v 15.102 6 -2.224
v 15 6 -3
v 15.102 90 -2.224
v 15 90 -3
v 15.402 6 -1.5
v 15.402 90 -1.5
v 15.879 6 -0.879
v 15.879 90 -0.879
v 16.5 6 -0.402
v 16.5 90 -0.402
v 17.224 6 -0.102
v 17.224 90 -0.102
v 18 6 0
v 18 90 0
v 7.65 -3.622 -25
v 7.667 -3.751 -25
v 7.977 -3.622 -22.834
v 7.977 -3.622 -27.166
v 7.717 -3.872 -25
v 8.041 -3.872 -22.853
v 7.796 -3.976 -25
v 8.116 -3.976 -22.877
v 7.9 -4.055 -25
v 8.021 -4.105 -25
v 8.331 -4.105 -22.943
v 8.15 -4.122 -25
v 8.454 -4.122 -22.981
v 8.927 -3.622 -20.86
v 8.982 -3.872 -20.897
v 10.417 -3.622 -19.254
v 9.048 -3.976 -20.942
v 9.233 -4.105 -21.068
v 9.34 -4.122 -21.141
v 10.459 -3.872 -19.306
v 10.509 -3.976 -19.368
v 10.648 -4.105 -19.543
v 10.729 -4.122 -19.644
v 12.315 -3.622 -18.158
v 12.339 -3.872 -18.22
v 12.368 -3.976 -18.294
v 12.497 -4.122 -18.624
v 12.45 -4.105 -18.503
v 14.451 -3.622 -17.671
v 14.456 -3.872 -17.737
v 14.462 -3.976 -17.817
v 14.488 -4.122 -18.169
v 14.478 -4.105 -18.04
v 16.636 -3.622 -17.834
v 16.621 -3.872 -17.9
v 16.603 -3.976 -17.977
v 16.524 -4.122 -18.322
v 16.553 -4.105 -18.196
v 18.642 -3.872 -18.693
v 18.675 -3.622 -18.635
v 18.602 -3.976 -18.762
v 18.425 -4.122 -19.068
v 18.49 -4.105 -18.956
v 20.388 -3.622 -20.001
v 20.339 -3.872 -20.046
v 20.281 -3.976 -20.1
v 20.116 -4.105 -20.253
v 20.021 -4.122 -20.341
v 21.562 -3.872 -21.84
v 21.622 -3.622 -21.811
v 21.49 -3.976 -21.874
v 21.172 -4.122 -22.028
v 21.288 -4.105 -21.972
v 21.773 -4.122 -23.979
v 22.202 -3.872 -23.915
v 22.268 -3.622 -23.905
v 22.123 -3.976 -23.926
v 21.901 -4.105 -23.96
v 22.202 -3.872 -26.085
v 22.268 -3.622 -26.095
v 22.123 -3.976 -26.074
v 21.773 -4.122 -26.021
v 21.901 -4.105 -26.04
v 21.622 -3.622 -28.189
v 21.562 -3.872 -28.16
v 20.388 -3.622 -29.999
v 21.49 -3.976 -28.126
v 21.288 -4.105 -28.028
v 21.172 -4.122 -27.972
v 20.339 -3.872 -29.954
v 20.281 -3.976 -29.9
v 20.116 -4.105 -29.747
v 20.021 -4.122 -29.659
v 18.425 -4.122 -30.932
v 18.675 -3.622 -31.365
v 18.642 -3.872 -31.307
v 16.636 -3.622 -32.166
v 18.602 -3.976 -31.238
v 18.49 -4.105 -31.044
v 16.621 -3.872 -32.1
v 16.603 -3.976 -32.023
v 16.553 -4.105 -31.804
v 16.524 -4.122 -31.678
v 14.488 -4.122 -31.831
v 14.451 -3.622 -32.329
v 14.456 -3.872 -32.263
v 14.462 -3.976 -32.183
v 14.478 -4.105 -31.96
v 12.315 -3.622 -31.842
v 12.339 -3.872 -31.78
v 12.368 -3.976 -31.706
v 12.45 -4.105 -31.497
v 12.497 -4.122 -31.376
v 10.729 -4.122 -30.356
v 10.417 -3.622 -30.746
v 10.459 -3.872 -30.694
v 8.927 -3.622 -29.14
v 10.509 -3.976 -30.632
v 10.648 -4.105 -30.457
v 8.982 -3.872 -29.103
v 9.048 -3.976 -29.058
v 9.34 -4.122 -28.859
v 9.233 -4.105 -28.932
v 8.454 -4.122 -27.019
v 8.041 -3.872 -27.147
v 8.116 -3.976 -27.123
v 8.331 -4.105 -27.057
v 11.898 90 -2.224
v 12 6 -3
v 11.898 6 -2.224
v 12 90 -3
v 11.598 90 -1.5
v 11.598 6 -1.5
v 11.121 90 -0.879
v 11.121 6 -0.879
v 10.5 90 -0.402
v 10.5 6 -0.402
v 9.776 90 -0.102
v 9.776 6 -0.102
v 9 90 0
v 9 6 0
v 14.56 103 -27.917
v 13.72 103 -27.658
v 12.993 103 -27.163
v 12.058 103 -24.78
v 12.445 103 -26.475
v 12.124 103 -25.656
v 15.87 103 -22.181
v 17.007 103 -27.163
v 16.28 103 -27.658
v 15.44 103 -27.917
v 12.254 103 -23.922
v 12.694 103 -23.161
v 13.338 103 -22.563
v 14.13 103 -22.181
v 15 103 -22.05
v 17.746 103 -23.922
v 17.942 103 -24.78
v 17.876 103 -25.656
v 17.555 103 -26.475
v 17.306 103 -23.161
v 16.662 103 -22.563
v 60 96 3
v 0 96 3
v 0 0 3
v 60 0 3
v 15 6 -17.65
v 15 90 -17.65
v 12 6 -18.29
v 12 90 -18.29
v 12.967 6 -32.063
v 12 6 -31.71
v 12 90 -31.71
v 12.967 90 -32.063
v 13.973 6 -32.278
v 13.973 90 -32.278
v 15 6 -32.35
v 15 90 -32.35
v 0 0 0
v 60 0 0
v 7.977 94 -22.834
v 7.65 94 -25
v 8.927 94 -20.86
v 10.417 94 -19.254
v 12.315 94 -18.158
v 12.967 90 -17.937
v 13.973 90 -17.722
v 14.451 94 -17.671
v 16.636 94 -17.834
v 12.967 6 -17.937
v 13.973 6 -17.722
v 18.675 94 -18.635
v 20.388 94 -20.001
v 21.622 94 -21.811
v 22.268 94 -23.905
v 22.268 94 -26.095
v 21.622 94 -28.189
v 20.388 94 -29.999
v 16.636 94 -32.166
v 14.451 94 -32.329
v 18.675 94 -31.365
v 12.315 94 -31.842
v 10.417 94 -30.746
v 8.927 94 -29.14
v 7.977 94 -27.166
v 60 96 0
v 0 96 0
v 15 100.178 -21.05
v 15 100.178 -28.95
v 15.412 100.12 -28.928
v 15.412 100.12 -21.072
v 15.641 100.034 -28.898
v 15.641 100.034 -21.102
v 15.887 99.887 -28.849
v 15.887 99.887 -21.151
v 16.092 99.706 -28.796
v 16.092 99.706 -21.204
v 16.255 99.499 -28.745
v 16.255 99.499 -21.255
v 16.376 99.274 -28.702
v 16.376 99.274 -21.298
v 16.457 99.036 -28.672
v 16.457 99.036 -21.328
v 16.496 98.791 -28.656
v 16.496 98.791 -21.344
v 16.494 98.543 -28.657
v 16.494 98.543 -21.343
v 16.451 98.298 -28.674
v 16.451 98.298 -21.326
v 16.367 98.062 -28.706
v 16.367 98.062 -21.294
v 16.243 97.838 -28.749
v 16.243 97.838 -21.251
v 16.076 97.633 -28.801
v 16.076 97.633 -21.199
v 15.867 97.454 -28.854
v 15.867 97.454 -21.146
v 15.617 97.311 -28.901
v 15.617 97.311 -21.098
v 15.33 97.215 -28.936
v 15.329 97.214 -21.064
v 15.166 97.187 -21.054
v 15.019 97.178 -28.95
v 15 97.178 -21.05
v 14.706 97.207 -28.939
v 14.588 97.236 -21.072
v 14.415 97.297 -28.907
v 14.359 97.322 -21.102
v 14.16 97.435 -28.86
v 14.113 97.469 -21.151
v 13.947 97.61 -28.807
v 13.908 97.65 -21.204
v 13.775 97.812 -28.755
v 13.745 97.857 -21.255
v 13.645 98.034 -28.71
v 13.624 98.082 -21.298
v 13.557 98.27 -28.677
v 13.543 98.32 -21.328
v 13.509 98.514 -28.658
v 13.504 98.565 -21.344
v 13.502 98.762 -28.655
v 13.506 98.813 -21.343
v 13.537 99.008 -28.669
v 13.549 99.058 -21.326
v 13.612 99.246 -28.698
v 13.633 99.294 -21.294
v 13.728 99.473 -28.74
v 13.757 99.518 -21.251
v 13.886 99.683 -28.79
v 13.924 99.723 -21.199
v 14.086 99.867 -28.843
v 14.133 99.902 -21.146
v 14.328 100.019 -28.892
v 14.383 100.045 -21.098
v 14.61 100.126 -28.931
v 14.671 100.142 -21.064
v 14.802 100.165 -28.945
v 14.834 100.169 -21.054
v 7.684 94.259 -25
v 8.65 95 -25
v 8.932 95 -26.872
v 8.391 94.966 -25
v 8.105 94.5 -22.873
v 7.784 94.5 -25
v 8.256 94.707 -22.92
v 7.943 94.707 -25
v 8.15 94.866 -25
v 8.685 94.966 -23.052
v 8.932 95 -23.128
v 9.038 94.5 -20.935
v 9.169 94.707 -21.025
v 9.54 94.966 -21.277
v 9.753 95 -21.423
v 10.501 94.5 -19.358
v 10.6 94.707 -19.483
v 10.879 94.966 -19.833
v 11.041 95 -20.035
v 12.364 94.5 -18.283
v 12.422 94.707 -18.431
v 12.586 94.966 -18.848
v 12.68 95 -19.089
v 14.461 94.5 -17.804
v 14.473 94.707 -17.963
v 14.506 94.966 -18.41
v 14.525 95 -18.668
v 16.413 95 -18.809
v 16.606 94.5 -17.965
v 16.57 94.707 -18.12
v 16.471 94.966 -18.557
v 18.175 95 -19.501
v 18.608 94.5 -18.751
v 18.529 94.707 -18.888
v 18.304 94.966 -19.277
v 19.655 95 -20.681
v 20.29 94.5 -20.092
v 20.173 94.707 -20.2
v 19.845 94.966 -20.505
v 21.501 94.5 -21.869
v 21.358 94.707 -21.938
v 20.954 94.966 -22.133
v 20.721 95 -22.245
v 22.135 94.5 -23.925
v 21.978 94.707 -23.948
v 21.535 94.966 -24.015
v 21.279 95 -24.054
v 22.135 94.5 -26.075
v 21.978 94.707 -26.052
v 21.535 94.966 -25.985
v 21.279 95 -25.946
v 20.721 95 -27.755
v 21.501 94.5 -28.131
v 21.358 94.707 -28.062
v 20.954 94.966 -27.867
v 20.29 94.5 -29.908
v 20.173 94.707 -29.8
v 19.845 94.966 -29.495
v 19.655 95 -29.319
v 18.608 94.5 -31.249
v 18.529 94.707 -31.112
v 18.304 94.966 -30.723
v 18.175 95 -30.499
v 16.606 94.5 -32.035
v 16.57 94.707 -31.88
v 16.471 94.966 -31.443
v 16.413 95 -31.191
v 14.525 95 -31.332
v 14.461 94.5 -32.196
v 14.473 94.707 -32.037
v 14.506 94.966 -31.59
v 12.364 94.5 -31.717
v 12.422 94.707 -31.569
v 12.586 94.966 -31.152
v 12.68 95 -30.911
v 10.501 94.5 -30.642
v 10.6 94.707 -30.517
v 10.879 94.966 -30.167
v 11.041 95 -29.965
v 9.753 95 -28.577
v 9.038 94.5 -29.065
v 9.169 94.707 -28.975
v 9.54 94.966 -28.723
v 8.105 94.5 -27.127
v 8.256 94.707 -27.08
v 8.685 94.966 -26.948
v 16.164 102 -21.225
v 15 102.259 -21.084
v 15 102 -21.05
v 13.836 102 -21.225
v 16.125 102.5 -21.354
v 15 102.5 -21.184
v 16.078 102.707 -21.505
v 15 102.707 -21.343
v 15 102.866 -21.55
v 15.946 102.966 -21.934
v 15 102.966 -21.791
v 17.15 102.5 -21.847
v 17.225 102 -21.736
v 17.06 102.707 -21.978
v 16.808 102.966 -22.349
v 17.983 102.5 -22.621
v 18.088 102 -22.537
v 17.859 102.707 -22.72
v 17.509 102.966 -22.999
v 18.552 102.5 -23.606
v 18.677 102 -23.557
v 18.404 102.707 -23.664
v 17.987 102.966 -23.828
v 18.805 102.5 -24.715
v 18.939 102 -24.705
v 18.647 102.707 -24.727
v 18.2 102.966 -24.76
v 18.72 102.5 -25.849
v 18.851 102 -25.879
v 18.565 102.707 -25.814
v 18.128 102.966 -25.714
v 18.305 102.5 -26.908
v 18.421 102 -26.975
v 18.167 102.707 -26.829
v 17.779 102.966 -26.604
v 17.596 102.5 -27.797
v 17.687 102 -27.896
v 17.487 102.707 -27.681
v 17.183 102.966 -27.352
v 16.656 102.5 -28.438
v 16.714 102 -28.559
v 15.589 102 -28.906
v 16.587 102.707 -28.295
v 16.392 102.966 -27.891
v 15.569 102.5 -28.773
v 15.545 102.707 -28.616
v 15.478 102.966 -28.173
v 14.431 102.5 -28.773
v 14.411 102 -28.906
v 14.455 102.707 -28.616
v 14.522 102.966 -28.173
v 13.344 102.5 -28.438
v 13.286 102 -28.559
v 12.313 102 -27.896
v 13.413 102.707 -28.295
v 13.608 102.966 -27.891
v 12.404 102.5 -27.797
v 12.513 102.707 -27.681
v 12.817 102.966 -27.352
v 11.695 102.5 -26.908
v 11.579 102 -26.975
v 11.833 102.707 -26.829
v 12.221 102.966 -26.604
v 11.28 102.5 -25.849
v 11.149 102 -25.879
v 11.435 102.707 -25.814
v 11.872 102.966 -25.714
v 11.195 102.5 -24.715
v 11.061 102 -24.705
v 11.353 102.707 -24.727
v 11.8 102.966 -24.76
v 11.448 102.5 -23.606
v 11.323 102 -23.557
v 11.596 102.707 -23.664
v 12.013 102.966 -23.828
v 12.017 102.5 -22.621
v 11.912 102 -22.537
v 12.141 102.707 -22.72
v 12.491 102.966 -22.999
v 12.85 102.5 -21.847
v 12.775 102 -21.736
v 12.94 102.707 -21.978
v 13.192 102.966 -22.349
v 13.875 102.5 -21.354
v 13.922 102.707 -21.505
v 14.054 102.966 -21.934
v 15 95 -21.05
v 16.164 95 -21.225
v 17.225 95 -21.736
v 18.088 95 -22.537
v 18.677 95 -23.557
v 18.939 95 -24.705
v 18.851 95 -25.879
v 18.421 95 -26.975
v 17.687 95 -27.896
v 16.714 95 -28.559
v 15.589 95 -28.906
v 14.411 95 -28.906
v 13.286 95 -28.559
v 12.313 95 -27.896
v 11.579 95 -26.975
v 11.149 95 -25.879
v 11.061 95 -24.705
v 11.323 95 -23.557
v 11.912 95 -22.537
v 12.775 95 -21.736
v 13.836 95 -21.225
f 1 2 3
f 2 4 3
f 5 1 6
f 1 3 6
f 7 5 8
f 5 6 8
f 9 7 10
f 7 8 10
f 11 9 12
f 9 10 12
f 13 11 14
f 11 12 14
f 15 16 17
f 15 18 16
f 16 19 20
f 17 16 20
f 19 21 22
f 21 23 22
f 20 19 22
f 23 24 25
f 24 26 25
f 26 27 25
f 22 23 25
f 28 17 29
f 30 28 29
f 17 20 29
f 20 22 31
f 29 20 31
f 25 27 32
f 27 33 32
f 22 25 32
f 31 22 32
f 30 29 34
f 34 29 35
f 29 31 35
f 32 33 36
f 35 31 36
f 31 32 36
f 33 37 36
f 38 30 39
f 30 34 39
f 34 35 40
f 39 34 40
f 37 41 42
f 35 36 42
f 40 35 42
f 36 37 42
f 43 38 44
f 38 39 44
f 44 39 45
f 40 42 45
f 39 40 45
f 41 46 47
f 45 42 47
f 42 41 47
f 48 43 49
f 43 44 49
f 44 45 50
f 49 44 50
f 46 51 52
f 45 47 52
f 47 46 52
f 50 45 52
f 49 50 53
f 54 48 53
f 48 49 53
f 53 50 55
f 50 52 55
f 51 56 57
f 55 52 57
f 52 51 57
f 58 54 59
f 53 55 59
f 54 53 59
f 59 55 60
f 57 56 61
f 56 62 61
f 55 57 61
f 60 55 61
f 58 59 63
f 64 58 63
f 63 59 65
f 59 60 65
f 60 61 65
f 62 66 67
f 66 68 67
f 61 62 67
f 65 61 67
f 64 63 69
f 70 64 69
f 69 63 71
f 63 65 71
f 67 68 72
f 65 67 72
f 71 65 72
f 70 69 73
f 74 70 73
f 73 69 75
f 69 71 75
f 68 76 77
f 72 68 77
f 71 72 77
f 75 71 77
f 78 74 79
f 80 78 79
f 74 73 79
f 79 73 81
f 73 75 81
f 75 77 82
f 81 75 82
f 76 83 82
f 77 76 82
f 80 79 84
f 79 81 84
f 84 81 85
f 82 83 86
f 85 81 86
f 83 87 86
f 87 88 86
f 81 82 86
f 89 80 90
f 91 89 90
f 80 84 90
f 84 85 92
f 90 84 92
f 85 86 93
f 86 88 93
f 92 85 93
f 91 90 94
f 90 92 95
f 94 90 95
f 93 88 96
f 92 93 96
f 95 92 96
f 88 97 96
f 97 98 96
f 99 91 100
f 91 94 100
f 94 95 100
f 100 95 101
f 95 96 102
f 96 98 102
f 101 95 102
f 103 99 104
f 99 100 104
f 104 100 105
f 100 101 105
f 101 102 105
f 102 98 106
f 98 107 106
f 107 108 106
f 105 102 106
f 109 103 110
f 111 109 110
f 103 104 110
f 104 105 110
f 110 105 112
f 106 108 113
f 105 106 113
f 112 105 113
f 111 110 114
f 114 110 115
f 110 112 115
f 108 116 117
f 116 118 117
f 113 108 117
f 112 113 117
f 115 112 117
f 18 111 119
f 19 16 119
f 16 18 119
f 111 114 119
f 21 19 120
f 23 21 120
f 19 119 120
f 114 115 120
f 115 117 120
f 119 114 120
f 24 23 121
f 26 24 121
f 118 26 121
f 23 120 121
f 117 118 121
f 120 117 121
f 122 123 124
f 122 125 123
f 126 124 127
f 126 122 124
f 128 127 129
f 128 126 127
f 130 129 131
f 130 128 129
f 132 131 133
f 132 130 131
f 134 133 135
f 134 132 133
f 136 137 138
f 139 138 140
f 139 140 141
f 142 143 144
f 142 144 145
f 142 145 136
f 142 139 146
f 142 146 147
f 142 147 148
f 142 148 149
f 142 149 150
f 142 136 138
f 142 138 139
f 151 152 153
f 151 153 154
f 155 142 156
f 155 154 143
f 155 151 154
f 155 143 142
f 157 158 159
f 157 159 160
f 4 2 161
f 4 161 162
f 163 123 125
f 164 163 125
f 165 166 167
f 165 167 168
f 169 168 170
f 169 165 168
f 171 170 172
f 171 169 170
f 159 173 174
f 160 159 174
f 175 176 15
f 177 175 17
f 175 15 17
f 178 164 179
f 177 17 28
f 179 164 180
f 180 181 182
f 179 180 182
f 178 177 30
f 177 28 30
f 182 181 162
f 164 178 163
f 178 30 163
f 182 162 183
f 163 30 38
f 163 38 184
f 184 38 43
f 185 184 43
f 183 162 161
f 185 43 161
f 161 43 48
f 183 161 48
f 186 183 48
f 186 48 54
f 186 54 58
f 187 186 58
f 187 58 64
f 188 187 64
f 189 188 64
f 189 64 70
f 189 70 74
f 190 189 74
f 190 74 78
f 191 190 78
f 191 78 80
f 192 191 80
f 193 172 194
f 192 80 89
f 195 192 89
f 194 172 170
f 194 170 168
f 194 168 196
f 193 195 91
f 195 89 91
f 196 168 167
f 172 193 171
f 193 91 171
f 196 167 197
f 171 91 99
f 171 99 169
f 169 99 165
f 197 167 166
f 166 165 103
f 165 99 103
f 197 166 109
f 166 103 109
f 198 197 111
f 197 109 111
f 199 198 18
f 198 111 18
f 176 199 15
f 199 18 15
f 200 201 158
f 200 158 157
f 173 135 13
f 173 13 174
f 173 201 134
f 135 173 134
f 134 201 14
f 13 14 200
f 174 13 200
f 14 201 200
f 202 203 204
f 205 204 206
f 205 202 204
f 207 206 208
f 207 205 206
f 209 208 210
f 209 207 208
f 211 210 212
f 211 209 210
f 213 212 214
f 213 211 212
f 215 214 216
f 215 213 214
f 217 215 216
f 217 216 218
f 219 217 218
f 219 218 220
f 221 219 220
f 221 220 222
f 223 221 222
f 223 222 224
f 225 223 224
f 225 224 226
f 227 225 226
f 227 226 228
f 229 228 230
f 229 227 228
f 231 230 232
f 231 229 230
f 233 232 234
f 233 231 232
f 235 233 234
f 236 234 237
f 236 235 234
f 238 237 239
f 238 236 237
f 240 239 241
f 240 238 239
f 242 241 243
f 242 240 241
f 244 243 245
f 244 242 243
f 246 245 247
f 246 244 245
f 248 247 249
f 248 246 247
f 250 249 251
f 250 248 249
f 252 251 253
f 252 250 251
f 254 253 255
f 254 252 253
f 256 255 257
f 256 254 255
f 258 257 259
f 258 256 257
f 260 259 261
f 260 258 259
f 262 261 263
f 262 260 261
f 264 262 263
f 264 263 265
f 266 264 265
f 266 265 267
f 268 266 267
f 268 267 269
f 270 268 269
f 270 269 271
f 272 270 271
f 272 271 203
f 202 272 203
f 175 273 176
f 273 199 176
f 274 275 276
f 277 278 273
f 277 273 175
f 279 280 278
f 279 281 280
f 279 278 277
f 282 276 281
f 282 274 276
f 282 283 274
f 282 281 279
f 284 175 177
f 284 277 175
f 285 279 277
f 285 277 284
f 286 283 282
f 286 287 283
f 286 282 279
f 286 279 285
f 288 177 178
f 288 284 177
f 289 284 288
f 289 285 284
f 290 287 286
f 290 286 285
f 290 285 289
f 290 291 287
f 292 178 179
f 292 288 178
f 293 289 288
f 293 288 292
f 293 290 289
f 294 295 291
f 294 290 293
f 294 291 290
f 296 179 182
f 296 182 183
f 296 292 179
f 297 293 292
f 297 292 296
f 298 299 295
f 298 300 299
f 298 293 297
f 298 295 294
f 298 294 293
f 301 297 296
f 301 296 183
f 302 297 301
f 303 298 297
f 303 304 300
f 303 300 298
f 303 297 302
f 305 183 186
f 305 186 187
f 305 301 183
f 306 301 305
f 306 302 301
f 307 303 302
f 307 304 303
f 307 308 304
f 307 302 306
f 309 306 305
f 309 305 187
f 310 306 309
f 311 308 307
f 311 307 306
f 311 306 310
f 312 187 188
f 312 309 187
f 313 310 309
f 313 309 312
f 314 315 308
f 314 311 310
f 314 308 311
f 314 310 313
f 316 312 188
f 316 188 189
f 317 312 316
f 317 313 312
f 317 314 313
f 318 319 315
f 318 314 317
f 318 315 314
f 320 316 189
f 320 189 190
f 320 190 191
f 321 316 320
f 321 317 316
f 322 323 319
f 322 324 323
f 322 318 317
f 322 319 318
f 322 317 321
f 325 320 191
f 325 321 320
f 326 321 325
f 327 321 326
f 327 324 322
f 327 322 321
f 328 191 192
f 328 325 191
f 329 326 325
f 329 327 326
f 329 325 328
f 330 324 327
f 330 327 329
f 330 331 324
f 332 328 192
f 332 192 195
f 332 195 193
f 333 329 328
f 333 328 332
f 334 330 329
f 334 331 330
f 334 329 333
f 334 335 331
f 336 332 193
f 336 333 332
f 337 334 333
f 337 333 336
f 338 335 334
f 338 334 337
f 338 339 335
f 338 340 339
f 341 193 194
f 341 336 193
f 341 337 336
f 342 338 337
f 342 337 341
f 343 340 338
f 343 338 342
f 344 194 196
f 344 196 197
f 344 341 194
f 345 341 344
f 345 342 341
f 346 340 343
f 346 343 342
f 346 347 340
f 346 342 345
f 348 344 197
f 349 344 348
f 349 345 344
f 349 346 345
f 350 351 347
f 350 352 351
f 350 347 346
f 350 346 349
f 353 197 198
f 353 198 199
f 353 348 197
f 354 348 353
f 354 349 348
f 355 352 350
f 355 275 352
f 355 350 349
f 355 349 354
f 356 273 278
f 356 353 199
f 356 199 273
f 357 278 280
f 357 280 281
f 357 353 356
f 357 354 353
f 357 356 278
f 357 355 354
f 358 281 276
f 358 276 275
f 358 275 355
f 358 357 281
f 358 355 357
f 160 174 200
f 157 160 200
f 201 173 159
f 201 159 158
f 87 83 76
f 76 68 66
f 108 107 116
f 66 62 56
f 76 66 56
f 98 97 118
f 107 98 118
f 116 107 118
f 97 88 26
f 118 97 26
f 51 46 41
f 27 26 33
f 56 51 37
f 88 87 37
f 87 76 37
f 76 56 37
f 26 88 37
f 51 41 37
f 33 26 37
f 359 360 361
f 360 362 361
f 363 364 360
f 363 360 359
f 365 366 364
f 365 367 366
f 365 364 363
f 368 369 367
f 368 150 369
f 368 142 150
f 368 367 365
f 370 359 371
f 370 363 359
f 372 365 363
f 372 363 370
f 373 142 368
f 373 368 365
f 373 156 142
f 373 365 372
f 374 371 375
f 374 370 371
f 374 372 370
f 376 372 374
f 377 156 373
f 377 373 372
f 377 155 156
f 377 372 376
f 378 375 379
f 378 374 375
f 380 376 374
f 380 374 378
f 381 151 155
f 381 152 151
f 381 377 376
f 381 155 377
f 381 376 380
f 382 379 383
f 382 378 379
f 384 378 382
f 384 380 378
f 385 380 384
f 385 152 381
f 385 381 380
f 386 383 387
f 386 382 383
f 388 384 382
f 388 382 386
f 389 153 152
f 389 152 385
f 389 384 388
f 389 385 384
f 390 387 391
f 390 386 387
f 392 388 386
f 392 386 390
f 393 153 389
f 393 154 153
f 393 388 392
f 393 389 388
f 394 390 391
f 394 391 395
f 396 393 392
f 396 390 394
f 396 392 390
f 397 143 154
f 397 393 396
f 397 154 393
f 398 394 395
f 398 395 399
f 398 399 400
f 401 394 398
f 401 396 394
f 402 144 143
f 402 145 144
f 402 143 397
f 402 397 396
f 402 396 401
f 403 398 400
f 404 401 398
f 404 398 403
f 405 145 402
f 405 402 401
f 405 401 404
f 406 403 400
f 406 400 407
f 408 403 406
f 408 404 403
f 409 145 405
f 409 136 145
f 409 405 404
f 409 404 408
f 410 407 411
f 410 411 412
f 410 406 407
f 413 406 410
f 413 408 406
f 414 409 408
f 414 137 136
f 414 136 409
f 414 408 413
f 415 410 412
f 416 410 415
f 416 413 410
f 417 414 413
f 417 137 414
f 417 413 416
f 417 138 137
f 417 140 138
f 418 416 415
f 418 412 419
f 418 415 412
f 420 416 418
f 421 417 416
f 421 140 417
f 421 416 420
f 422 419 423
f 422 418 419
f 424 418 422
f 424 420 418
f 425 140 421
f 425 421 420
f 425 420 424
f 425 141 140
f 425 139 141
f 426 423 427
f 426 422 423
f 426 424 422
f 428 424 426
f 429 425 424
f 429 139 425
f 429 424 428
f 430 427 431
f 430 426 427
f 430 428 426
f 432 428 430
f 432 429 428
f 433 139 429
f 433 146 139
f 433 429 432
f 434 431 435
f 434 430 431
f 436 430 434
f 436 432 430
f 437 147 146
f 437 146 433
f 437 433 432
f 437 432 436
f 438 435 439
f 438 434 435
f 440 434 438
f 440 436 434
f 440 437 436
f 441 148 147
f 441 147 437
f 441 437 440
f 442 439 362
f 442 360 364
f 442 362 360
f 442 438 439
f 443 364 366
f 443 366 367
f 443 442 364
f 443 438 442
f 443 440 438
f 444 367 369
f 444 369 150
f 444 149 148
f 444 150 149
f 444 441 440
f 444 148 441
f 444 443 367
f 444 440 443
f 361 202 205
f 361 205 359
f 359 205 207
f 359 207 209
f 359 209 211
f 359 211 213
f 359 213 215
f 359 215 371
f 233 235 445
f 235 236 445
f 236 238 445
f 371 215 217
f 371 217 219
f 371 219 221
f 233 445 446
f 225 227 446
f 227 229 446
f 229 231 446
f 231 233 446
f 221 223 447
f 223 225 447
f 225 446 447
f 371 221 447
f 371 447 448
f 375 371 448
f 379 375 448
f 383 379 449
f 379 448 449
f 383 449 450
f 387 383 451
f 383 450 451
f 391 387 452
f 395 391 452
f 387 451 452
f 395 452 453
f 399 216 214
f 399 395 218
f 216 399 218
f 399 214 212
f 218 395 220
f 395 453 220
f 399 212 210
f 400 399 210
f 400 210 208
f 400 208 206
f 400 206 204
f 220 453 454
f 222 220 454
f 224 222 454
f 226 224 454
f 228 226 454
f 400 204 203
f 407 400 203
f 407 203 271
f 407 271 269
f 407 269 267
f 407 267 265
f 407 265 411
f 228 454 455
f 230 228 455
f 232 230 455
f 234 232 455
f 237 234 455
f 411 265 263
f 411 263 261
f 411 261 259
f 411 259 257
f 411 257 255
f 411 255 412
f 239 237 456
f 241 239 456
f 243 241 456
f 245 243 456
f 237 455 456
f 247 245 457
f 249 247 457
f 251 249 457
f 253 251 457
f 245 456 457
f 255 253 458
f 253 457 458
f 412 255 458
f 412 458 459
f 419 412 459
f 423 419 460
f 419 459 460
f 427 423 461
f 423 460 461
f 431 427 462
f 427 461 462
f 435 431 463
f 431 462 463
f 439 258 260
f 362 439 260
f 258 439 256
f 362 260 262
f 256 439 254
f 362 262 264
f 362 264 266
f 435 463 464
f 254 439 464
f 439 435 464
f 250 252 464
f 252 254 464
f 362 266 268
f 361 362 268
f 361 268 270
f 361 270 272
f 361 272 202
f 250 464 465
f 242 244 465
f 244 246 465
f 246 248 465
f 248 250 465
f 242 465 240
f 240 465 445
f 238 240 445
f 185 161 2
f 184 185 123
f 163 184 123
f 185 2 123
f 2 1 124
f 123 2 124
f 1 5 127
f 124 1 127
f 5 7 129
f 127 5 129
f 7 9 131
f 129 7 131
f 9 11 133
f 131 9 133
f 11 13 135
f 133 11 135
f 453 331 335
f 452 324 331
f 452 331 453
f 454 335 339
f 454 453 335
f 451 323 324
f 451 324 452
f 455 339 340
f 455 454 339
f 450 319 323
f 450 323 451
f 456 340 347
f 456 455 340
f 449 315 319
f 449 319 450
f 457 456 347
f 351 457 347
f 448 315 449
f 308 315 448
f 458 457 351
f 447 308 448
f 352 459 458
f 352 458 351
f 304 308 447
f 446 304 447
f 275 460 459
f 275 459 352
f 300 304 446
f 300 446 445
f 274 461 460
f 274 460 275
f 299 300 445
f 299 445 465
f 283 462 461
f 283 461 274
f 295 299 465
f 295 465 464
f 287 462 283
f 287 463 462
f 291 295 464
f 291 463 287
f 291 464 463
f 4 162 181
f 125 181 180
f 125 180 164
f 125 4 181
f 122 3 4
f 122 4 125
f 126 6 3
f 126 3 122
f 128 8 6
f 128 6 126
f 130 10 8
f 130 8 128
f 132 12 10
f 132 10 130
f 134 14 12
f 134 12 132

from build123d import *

# Parameters (mm, degrees)
SKETCH_1_W               = 60
SKETCH_1_H               = 96
EXTRUDE_1_DEPTH          = 3
SKETCH_2_W               = 3
SKETCH_2_H               = 84
EXTRUDE_2_DEPTH          = 38
EXTRUDE_3_DEPTH          = 5
EXTRUDE_3_DEPTH_BACK     = 94.122011
SKETCH_4_R               = 7.35
SKETCH_5_R               = 3.95
EXTRUDE_4_DEPTH          = 8
FILLET_2_R               = 1
CUT_EXTRUDE_1_DEPTH      = 124.40908597
CUT_EXTRUDE_1_DEPTH_BACK = 124.40908597
SKETCH_9_R               = 1.5
FILLET_3_R               = 0.5
CUT_EXTRUDE_START        = 6
CUT_EXTRUDE_3_DEPTH      = 84
FILLET_6_R               = 3


# Read off the part's stored shape, not the designer's step: 切除-拉伸3
with BuildPart() as part:
    # 草图1 → 凸台-拉伸1 (new body)
    with BuildSketch(Plane.XY):
        with Locations((30, 48)):
            Rectangle(SKETCH_1_W, SKETCH_1_H)
    extrude(amount=EXTRUDE_1_DEPTH)

    # 草图2 → 凸台-拉伸2 (add)
    with BuildSketch(Plane(origin=(0, 0, 0), x_dir=(-1, 0, 0), z_dir=(0, 0, -1))):
        with Locations((-13.5, 48)):
            Rectangle(SKETCH_2_W, SKETCH_2_H)
    extrude(amount=EXTRUDE_2_DEPTH)

    # 草图4 → 凸台-拉伸3 (add, two sides: drawn at the far end of the back side and taken through both)
    with BuildSketch(Plane(origin=(0, 90, 0), x_dir=(1, 0, 0), z_dir=(0, 1, 0)).offset(-EXTRUDE_3_DEPTH_BACK)):
        with Locations(Location((15, 25, 0), (0, 0, 180))):
            Circle(SKETCH_4_R)
    extrude(amount=EXTRUDE_3_DEPTH + EXTRUDE_3_DEPTH_BACK)

    # 草图5 → 凸台-拉伸4 (add)
    with BuildSketch(Plane(origin=(0, 95, 0), x_dir=(1, 0, 0), z_dir=(0, 1, 0))):
        with Locations(Location((15, 25, 0), (0, 0, 270))):
            Circle(SKETCH_5_R)
    extrude(amount=EXTRUDE_4_DEPTH)

    # 圆角2
    fillet_2_edges = [part.edges().sort_by_distance(p)[0] for p in [
        (22.35, 95, -25),
        (15, 103, -28.95),
    ]]
    fillet(fillet_2_edges, radius=FILLET_2_R)

    # 草图9 → 切除-拉伸1 (cut, two sides: drawn at the far end of the back side and taken through both)
    with BuildSketch(Plane(origin=(0, 0, -28.95), x_dir=(-1, 0, 0), z_dir=(0, 0, -1)).offset(-CUT_EXTRUDE_1_DEPTH_BACK)):
        with Locations(Location((-15, 98.677988735, 0), (0, 0, 90.000000013))):
            Circle(SKETCH_9_R)
    extrude(amount=CUT_EXTRUDE_1_DEPTH + CUT_EXTRUDE_1_DEPTH_BACK, mode=Mode.SUBTRACT)

    # 圆角3
    fillet_3_edges = [part.edges().sort_by_distance(p)[0] for p in [
        (22.35, -4.122011, -25),
    ]]
    fillet(fillet_3_edges, radius=FILLET_3_R)

    # 切除-拉伸3 outline → 切除-拉伸3 (cut)
    with BuildSketch(Plane(origin=(0, 0, 0), x_dir=(1, 0, 0), z_dir=(0, 1, 0)).offset(CUT_EXTRUDE_START)):
        with BuildLine():
            Line((12, 38), (12, 31.709880774))
            ThreePointArc((12, 31.709880774), (13.466233996, 32.188189052), (15, 32.35))
            Line((15, 32.35), (15, 38))
            Line((15, 38), (12, 38))
        make_face()
    extrude(amount=CUT_EXTRUDE_3_DEPTH, mode=Mode.SUBTRACT)

    # 圆角6
    fillet_6_edges = [part.edges().sort_by_distance(p)[0] for p in [
        (12, 48, 0),
        (15, 48, 0),
    ]]
    fillet(fillet_6_edges, radius=FILLET_6_R)


solid = part.part
